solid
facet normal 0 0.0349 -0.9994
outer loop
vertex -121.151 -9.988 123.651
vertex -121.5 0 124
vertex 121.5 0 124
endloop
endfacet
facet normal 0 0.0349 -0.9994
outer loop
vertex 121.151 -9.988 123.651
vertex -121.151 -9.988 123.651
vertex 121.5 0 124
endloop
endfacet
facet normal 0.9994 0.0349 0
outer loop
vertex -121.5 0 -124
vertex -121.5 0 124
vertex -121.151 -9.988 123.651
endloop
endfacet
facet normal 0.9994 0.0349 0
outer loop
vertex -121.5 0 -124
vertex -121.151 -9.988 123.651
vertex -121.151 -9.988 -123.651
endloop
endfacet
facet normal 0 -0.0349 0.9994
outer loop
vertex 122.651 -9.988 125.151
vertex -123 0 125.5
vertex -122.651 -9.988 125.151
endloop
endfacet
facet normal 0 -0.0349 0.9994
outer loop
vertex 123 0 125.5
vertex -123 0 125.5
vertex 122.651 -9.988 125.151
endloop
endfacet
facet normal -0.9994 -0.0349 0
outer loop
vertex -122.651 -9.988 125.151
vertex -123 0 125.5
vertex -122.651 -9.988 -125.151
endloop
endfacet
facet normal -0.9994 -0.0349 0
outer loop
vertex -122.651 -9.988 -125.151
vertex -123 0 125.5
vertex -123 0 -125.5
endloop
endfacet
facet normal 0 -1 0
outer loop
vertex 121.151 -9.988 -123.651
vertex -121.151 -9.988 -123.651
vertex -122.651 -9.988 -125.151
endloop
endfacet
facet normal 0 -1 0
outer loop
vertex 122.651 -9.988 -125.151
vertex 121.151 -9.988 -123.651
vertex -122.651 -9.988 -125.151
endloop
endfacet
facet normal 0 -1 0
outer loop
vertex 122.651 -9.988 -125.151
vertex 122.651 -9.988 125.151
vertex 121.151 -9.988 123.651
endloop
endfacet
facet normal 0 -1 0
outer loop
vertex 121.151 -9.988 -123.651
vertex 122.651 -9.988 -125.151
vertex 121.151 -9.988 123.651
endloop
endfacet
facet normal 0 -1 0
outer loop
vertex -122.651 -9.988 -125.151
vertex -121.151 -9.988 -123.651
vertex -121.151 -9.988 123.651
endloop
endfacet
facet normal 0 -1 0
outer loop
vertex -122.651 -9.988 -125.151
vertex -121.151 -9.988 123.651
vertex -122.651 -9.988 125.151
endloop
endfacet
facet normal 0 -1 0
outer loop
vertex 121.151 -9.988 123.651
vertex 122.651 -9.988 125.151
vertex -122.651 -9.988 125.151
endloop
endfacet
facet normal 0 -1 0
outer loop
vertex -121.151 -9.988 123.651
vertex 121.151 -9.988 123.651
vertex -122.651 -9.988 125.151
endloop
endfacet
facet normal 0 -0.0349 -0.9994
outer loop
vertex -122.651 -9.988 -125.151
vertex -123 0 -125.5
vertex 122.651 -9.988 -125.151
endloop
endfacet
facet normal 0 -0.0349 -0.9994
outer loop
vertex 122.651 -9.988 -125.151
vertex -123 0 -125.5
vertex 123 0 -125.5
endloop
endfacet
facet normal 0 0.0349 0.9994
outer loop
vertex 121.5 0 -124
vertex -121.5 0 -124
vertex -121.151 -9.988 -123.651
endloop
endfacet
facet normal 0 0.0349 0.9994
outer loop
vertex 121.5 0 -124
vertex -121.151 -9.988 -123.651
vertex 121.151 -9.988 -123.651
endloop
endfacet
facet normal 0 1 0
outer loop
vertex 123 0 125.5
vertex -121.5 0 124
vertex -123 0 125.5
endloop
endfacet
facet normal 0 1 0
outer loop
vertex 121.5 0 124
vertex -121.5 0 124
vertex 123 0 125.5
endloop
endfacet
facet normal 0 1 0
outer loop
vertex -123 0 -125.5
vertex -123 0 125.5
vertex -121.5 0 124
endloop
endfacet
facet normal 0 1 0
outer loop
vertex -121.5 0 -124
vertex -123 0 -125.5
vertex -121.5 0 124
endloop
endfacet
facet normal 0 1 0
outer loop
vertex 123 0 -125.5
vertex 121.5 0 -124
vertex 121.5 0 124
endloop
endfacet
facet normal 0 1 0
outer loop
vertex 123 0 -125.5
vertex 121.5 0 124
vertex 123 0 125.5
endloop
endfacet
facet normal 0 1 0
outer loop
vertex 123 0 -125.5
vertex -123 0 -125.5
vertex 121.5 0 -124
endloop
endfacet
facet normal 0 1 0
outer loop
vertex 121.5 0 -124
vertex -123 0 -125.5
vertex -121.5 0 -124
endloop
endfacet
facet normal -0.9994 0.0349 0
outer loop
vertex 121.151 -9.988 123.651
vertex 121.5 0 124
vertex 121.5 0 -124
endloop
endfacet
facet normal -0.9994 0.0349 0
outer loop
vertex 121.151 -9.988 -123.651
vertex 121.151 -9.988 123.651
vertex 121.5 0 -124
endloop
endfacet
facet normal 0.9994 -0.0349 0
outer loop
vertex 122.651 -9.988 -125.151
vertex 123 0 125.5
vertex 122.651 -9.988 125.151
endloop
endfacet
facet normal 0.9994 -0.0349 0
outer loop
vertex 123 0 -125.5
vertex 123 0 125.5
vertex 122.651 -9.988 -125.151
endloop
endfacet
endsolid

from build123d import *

# Parameters (mm, degrees)
SKETCH2_W           = 246
SKETCH2_H           = 251
BOSS_EXTRUDE1_DEPTH = 10
BOSS_EXTRUDE1_DRAFT = -2
SKETCH5_W           = 243
SKETCH5_H           = 248
CUT_EXTRUDE1_DEPTH  = 177.009232712
CUT_EXTRUDE1_DRAFT  = -2
CUT_EXTRUDE2_DEPTH  = 280.607703212


with BuildPart() as part:
    # Sketch2 → Boss-Extrude1 (with draft: the straight prism first)
    with BuildSketch(Plane(origin=(0, 0, 0), x_dir=(1, 0, 0), z_dir=(0, 1, 0))):
        Rectangle(SKETCH2_W, SKETCH2_H)
    extrude(amount=-BOSS_EXTRUDE1_DEPTH)
    # Boss-Extrude1: the draft: its side faces are tilted about the plane it starts from
    boss_extrude1_sides = [part.faces().sort_by_distance(p)[0] for p in [
        (0, -5, 125.5),
        (123, -5, 0),
        (0, -5, -125.5),
        (-123, -5, 0),
    ]]
    draft(boss_extrude1_sides, Plane(origin=(0, 0, 0), x_dir=(1, 0, 0), z_dir=(0, 1, 0)), BOSS_EXTRUDE1_DRAFT)


with BuildPart() as cut_extrude1_tool:
    # Sketch5 → Cut-Extrude1 (with draft: the straight prism first)
    with BuildSketch(Plane(origin=(0, 0, 0), x_dir=(1, 0, 0), z_dir=(0, 1, 0))):
        Rectangle(SKETCH5_W, SKETCH5_H)
    extrude(amount=-CUT_EXTRUDE1_DEPTH)
    # Cut-Extrude1: the draft: its side faces are tilted about the plane it starts from
    cut_extrude1_sides = [cut_extrude1_tool.faces().sort_by_distance(p)[0] for p in [
        (121.5, -88.504616356, 0),
        (0, -88.504616356, -124),
        (-121.5, -88.504616356, 0),
        (0, -88.504616356, 124),
    ]]
    draft(cut_extrude1_sides, Plane(origin=(0, 0, 0), x_dir=(1, 0, 0), z_dir=(0, 1, 0)), CUT_EXTRUDE1_DRAFT)


with BuildPart() as part_1:
    add(part.part)

    # Cut-Extrude1: cut by cut_extrude1_tool
    add(cut_extrude1_tool.part, mode=Mode.SUBTRACT)

    # Sketch9 → Cut-Extrude2 (cut, through all, along a direction that is not the sketch's normal)
    with BuildSketch(Plane(origin=(0, -4.377218727, 125.347144154), x_dir=(1, 0, 0), z_dir=(0, -0.03489949670250105, 0.9993908270190958))):
        Polygon((-122.651217373, -5.614028847), (-122.650792305, -5.626208607), (122.650792305, -5.626208607), (122.651217373, -5.614028847), align=None)
    extrude(amount=-CUT_EXTRUDE2_DEPTH, dir=(0, 0, 1), mode=Mode.SUBTRACT)


solid = part_1.part
